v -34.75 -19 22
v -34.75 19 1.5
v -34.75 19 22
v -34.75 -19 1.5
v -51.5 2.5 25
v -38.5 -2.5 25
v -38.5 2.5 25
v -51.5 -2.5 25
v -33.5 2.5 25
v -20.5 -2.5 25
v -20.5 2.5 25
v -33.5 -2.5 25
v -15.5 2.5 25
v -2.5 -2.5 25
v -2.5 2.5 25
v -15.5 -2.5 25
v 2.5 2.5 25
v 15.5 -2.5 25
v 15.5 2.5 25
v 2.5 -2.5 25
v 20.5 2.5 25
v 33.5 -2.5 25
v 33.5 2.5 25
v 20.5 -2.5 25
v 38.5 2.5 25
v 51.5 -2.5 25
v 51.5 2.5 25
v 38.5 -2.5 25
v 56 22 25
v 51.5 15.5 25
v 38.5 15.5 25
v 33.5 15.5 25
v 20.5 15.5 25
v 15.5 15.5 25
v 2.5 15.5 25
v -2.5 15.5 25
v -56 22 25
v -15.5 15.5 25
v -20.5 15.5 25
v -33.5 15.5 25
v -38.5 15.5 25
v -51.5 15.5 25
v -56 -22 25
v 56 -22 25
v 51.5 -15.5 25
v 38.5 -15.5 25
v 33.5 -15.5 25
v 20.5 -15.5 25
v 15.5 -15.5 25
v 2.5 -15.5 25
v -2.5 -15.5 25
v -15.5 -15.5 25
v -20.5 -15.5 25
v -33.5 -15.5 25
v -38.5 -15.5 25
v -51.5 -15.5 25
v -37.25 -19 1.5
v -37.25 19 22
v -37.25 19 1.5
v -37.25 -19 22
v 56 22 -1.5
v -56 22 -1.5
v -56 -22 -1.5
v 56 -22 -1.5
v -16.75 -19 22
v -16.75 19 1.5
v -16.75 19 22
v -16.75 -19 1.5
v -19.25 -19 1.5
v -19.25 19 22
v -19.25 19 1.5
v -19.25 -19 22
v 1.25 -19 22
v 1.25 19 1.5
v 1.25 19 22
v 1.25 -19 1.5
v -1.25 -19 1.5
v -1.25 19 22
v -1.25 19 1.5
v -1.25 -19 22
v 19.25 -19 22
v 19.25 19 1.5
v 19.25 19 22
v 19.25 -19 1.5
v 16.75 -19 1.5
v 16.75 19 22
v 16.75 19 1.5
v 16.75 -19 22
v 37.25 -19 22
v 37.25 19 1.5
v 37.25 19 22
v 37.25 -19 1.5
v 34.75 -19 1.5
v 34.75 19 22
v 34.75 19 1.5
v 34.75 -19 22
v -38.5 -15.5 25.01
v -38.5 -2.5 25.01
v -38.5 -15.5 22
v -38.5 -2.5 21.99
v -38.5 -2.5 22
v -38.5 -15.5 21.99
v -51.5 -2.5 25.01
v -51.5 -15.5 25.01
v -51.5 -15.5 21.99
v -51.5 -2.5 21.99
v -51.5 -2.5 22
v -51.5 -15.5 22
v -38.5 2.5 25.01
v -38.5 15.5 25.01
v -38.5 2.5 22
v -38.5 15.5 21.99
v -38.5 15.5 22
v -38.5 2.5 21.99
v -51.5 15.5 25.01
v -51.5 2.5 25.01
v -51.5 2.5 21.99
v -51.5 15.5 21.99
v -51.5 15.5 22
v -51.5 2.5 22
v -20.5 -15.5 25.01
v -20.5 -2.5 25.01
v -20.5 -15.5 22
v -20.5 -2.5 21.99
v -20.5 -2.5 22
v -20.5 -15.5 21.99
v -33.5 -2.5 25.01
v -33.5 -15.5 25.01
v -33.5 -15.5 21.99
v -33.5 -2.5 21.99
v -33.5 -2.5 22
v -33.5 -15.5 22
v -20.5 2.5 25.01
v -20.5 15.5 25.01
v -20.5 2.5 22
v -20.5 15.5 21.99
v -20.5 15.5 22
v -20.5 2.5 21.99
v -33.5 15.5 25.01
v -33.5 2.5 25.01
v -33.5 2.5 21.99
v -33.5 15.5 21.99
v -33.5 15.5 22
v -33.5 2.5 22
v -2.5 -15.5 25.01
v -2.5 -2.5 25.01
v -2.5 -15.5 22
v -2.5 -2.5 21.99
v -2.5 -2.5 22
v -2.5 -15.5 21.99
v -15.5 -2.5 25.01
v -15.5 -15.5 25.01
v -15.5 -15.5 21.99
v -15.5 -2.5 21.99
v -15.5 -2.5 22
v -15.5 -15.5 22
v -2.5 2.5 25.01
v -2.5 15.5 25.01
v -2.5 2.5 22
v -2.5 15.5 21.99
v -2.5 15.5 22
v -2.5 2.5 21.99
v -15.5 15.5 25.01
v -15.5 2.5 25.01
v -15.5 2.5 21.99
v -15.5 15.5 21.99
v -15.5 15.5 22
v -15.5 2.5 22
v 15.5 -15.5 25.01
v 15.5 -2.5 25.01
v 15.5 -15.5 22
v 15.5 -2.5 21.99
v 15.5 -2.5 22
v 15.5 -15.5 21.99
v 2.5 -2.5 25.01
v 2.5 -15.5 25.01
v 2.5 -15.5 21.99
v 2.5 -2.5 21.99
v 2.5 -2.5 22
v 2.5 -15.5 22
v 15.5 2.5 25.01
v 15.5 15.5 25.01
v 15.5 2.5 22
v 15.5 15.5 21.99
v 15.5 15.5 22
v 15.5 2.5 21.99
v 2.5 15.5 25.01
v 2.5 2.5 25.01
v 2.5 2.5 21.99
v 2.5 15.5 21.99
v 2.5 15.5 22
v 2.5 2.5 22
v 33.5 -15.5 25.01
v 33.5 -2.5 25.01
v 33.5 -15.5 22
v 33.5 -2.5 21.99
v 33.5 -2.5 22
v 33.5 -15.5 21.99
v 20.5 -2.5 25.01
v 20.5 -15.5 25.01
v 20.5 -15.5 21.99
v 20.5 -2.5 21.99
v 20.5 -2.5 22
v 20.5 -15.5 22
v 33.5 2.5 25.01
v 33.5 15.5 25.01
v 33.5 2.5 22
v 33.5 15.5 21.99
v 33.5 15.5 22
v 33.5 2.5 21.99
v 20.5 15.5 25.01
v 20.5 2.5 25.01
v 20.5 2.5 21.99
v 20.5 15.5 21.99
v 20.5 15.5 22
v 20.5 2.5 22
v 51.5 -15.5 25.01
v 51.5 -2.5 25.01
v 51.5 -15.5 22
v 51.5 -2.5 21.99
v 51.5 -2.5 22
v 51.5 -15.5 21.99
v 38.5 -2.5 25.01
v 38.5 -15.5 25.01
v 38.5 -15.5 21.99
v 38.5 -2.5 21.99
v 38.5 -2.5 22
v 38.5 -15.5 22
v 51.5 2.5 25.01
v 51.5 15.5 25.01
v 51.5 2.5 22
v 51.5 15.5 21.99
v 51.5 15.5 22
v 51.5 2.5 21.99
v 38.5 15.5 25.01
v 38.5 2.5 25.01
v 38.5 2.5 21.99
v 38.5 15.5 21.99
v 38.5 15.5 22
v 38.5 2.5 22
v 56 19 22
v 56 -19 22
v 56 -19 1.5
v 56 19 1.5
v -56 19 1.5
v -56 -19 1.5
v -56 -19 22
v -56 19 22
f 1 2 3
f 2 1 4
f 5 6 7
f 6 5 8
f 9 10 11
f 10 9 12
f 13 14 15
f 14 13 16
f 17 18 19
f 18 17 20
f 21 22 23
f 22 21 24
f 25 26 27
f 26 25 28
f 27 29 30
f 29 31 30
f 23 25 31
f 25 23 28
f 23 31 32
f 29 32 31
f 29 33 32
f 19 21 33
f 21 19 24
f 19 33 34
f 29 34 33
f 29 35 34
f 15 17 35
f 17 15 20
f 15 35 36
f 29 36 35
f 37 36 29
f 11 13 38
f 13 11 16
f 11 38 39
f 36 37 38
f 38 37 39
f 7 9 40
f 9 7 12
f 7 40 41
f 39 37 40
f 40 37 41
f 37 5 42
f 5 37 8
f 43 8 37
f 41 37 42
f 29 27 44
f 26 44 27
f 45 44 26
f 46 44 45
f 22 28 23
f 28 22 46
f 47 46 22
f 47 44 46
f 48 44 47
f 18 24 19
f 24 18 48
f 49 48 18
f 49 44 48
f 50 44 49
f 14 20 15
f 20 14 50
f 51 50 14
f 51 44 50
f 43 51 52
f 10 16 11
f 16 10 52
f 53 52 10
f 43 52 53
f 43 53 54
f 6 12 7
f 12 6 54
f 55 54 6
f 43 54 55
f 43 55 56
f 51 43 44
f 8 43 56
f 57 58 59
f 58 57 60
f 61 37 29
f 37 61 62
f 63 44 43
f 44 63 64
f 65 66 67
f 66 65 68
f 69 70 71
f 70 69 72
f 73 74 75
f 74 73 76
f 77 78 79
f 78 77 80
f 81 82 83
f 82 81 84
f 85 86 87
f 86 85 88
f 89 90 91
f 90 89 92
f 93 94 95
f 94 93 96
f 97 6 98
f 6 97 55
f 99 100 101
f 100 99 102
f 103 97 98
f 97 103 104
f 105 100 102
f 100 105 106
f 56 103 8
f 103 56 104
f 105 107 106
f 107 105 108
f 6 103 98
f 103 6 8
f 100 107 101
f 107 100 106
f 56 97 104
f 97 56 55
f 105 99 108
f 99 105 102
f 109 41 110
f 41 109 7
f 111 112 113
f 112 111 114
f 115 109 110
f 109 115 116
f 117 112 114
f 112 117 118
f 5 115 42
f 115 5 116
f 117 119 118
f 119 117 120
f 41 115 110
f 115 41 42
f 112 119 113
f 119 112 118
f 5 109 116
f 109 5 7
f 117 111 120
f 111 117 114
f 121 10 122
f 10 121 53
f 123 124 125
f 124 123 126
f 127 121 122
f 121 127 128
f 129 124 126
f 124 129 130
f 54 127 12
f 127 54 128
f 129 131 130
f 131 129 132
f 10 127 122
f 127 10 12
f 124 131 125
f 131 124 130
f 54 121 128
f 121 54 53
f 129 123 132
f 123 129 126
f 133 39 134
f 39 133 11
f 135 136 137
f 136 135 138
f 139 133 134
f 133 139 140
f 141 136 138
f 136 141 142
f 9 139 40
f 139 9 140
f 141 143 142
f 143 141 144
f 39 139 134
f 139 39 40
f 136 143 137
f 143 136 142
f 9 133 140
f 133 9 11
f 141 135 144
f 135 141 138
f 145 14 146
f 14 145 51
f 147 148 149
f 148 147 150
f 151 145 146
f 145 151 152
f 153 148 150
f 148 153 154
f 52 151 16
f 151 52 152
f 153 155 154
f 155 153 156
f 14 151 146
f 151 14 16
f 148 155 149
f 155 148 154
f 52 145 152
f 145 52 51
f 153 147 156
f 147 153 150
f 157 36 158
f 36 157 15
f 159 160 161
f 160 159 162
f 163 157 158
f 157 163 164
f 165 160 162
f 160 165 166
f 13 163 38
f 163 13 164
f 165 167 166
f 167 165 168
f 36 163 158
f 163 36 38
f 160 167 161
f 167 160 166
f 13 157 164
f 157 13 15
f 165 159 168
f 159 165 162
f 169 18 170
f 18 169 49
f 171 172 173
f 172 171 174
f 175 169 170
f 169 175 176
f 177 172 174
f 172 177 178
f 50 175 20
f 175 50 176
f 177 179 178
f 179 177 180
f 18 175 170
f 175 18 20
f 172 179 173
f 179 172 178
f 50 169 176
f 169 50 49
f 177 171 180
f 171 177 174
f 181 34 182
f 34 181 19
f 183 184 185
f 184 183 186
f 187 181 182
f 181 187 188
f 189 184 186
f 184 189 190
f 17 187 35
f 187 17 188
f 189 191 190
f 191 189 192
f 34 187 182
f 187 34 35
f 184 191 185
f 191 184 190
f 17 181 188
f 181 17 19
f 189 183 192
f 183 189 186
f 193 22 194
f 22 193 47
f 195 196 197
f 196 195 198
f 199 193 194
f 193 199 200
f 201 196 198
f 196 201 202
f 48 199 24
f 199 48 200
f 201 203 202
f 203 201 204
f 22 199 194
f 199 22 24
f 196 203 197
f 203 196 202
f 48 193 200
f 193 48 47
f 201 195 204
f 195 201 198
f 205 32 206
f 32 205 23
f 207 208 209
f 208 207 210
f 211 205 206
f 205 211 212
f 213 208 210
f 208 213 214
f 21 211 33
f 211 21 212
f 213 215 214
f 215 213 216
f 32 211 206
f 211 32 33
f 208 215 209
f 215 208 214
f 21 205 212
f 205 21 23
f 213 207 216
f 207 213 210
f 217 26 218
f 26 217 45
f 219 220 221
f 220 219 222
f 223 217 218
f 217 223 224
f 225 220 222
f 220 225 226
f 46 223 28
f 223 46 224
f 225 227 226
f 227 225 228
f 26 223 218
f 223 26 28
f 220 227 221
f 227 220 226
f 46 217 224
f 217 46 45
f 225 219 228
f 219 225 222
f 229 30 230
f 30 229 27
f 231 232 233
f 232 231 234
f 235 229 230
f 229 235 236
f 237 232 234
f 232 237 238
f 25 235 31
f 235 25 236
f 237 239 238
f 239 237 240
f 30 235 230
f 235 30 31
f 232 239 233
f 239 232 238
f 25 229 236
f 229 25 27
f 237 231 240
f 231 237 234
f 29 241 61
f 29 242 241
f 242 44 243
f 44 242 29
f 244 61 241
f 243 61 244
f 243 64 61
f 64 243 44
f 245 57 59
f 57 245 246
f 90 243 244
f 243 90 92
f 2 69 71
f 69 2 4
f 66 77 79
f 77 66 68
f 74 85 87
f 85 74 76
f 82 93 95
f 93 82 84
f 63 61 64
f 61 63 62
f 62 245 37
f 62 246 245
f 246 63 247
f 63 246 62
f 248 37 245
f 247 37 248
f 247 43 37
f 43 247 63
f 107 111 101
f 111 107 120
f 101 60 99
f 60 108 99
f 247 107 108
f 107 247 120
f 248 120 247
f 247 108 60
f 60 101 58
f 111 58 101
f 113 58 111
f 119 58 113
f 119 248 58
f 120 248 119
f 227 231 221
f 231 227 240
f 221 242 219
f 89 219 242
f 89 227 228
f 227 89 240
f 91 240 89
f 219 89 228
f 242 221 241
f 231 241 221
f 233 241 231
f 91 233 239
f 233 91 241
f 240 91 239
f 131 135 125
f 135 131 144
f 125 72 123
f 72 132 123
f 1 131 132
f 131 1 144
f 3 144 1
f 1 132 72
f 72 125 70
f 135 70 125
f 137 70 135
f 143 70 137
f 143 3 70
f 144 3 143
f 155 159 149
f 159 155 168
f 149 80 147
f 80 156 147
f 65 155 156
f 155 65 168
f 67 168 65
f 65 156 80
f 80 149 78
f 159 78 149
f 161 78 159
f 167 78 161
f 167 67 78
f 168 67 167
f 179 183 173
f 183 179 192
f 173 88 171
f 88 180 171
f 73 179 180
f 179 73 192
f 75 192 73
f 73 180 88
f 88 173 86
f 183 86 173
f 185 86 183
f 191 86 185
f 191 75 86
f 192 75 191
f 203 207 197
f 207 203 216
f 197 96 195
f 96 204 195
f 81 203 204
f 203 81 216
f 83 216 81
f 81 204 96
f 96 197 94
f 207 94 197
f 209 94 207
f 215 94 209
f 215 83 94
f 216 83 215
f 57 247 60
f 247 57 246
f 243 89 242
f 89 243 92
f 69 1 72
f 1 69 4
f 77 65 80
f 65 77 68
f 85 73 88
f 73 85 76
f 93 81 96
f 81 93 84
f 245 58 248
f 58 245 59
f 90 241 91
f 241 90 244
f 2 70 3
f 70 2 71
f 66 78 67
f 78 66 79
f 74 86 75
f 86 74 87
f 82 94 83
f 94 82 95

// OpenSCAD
// Dimensions (mm)
base_x = 112;
base_y = 44;
base_z = 3;
deck_z_start = 22;
deck_z_end = 25;
deck_thickness = deck_z_end - deck_z_start;
wall_end_thickness = 3;
wall_rib_thickness = 2.5;
wall_depth = base_y;
wall_height = 25;
rib_positions = [-36, -18, 0, 18, 36];
hole_size = 13;
hole_spacing_x = 18;
hole_spacing_y = 18;
$fn = 64;

// Base plate
translate([0, 0, 0])
  cube([base_x, base_y, base_z], center = true);

// Deck plate
translate([0, 0, deck_z_start + deck_thickness / 2])
  cube([base_x, base_y, deck_thickness], center = true);

// End walls (flush with short ends, i.e., at y = +/- base_y/2)
// Left end wall
translate([0, -base_y / 2 + wall_end_thickness / 2, wall_height / 2])
  cube([base_x, wall_end_thickness, wall_height], center = true);

// Right end wall
translate([0, base_y / 2 - wall_end_thickness / 2, wall_height / 2])
  cube([base_x, wall_end_thickness, wall_height], center = true);

// Five ribs
for (x = rib_positions) {
  translate([x, 0, wall_height / 2])
    cube([wall_rib_thickness, wall_depth, wall_height], center = true);
}

// 12 square through-holes in deck: 2 rows (Y) x 6 columns (X)
// Centred on deck, spacing 18 mm
// X positions: -45, -27, -9, 9, 27, 45 (since 6 holes * 18 = 108 span, centred)
// Y positions: -9, 9 (since 2 holes * 18 = 36 span, centred)
hole_x_positions = [-45, -27, -9, 9, 27, 45];
hole_y_positions = [-9, 9];

for (hx = hole_x_positions) {
  for (hy = hole_y_positions) {
    translate([hx, hy, deck_z_start + deck_thickness / 2])
      cube([hole_size, hole_size, deck_thickness + 0.02], center = true);
  }
}
